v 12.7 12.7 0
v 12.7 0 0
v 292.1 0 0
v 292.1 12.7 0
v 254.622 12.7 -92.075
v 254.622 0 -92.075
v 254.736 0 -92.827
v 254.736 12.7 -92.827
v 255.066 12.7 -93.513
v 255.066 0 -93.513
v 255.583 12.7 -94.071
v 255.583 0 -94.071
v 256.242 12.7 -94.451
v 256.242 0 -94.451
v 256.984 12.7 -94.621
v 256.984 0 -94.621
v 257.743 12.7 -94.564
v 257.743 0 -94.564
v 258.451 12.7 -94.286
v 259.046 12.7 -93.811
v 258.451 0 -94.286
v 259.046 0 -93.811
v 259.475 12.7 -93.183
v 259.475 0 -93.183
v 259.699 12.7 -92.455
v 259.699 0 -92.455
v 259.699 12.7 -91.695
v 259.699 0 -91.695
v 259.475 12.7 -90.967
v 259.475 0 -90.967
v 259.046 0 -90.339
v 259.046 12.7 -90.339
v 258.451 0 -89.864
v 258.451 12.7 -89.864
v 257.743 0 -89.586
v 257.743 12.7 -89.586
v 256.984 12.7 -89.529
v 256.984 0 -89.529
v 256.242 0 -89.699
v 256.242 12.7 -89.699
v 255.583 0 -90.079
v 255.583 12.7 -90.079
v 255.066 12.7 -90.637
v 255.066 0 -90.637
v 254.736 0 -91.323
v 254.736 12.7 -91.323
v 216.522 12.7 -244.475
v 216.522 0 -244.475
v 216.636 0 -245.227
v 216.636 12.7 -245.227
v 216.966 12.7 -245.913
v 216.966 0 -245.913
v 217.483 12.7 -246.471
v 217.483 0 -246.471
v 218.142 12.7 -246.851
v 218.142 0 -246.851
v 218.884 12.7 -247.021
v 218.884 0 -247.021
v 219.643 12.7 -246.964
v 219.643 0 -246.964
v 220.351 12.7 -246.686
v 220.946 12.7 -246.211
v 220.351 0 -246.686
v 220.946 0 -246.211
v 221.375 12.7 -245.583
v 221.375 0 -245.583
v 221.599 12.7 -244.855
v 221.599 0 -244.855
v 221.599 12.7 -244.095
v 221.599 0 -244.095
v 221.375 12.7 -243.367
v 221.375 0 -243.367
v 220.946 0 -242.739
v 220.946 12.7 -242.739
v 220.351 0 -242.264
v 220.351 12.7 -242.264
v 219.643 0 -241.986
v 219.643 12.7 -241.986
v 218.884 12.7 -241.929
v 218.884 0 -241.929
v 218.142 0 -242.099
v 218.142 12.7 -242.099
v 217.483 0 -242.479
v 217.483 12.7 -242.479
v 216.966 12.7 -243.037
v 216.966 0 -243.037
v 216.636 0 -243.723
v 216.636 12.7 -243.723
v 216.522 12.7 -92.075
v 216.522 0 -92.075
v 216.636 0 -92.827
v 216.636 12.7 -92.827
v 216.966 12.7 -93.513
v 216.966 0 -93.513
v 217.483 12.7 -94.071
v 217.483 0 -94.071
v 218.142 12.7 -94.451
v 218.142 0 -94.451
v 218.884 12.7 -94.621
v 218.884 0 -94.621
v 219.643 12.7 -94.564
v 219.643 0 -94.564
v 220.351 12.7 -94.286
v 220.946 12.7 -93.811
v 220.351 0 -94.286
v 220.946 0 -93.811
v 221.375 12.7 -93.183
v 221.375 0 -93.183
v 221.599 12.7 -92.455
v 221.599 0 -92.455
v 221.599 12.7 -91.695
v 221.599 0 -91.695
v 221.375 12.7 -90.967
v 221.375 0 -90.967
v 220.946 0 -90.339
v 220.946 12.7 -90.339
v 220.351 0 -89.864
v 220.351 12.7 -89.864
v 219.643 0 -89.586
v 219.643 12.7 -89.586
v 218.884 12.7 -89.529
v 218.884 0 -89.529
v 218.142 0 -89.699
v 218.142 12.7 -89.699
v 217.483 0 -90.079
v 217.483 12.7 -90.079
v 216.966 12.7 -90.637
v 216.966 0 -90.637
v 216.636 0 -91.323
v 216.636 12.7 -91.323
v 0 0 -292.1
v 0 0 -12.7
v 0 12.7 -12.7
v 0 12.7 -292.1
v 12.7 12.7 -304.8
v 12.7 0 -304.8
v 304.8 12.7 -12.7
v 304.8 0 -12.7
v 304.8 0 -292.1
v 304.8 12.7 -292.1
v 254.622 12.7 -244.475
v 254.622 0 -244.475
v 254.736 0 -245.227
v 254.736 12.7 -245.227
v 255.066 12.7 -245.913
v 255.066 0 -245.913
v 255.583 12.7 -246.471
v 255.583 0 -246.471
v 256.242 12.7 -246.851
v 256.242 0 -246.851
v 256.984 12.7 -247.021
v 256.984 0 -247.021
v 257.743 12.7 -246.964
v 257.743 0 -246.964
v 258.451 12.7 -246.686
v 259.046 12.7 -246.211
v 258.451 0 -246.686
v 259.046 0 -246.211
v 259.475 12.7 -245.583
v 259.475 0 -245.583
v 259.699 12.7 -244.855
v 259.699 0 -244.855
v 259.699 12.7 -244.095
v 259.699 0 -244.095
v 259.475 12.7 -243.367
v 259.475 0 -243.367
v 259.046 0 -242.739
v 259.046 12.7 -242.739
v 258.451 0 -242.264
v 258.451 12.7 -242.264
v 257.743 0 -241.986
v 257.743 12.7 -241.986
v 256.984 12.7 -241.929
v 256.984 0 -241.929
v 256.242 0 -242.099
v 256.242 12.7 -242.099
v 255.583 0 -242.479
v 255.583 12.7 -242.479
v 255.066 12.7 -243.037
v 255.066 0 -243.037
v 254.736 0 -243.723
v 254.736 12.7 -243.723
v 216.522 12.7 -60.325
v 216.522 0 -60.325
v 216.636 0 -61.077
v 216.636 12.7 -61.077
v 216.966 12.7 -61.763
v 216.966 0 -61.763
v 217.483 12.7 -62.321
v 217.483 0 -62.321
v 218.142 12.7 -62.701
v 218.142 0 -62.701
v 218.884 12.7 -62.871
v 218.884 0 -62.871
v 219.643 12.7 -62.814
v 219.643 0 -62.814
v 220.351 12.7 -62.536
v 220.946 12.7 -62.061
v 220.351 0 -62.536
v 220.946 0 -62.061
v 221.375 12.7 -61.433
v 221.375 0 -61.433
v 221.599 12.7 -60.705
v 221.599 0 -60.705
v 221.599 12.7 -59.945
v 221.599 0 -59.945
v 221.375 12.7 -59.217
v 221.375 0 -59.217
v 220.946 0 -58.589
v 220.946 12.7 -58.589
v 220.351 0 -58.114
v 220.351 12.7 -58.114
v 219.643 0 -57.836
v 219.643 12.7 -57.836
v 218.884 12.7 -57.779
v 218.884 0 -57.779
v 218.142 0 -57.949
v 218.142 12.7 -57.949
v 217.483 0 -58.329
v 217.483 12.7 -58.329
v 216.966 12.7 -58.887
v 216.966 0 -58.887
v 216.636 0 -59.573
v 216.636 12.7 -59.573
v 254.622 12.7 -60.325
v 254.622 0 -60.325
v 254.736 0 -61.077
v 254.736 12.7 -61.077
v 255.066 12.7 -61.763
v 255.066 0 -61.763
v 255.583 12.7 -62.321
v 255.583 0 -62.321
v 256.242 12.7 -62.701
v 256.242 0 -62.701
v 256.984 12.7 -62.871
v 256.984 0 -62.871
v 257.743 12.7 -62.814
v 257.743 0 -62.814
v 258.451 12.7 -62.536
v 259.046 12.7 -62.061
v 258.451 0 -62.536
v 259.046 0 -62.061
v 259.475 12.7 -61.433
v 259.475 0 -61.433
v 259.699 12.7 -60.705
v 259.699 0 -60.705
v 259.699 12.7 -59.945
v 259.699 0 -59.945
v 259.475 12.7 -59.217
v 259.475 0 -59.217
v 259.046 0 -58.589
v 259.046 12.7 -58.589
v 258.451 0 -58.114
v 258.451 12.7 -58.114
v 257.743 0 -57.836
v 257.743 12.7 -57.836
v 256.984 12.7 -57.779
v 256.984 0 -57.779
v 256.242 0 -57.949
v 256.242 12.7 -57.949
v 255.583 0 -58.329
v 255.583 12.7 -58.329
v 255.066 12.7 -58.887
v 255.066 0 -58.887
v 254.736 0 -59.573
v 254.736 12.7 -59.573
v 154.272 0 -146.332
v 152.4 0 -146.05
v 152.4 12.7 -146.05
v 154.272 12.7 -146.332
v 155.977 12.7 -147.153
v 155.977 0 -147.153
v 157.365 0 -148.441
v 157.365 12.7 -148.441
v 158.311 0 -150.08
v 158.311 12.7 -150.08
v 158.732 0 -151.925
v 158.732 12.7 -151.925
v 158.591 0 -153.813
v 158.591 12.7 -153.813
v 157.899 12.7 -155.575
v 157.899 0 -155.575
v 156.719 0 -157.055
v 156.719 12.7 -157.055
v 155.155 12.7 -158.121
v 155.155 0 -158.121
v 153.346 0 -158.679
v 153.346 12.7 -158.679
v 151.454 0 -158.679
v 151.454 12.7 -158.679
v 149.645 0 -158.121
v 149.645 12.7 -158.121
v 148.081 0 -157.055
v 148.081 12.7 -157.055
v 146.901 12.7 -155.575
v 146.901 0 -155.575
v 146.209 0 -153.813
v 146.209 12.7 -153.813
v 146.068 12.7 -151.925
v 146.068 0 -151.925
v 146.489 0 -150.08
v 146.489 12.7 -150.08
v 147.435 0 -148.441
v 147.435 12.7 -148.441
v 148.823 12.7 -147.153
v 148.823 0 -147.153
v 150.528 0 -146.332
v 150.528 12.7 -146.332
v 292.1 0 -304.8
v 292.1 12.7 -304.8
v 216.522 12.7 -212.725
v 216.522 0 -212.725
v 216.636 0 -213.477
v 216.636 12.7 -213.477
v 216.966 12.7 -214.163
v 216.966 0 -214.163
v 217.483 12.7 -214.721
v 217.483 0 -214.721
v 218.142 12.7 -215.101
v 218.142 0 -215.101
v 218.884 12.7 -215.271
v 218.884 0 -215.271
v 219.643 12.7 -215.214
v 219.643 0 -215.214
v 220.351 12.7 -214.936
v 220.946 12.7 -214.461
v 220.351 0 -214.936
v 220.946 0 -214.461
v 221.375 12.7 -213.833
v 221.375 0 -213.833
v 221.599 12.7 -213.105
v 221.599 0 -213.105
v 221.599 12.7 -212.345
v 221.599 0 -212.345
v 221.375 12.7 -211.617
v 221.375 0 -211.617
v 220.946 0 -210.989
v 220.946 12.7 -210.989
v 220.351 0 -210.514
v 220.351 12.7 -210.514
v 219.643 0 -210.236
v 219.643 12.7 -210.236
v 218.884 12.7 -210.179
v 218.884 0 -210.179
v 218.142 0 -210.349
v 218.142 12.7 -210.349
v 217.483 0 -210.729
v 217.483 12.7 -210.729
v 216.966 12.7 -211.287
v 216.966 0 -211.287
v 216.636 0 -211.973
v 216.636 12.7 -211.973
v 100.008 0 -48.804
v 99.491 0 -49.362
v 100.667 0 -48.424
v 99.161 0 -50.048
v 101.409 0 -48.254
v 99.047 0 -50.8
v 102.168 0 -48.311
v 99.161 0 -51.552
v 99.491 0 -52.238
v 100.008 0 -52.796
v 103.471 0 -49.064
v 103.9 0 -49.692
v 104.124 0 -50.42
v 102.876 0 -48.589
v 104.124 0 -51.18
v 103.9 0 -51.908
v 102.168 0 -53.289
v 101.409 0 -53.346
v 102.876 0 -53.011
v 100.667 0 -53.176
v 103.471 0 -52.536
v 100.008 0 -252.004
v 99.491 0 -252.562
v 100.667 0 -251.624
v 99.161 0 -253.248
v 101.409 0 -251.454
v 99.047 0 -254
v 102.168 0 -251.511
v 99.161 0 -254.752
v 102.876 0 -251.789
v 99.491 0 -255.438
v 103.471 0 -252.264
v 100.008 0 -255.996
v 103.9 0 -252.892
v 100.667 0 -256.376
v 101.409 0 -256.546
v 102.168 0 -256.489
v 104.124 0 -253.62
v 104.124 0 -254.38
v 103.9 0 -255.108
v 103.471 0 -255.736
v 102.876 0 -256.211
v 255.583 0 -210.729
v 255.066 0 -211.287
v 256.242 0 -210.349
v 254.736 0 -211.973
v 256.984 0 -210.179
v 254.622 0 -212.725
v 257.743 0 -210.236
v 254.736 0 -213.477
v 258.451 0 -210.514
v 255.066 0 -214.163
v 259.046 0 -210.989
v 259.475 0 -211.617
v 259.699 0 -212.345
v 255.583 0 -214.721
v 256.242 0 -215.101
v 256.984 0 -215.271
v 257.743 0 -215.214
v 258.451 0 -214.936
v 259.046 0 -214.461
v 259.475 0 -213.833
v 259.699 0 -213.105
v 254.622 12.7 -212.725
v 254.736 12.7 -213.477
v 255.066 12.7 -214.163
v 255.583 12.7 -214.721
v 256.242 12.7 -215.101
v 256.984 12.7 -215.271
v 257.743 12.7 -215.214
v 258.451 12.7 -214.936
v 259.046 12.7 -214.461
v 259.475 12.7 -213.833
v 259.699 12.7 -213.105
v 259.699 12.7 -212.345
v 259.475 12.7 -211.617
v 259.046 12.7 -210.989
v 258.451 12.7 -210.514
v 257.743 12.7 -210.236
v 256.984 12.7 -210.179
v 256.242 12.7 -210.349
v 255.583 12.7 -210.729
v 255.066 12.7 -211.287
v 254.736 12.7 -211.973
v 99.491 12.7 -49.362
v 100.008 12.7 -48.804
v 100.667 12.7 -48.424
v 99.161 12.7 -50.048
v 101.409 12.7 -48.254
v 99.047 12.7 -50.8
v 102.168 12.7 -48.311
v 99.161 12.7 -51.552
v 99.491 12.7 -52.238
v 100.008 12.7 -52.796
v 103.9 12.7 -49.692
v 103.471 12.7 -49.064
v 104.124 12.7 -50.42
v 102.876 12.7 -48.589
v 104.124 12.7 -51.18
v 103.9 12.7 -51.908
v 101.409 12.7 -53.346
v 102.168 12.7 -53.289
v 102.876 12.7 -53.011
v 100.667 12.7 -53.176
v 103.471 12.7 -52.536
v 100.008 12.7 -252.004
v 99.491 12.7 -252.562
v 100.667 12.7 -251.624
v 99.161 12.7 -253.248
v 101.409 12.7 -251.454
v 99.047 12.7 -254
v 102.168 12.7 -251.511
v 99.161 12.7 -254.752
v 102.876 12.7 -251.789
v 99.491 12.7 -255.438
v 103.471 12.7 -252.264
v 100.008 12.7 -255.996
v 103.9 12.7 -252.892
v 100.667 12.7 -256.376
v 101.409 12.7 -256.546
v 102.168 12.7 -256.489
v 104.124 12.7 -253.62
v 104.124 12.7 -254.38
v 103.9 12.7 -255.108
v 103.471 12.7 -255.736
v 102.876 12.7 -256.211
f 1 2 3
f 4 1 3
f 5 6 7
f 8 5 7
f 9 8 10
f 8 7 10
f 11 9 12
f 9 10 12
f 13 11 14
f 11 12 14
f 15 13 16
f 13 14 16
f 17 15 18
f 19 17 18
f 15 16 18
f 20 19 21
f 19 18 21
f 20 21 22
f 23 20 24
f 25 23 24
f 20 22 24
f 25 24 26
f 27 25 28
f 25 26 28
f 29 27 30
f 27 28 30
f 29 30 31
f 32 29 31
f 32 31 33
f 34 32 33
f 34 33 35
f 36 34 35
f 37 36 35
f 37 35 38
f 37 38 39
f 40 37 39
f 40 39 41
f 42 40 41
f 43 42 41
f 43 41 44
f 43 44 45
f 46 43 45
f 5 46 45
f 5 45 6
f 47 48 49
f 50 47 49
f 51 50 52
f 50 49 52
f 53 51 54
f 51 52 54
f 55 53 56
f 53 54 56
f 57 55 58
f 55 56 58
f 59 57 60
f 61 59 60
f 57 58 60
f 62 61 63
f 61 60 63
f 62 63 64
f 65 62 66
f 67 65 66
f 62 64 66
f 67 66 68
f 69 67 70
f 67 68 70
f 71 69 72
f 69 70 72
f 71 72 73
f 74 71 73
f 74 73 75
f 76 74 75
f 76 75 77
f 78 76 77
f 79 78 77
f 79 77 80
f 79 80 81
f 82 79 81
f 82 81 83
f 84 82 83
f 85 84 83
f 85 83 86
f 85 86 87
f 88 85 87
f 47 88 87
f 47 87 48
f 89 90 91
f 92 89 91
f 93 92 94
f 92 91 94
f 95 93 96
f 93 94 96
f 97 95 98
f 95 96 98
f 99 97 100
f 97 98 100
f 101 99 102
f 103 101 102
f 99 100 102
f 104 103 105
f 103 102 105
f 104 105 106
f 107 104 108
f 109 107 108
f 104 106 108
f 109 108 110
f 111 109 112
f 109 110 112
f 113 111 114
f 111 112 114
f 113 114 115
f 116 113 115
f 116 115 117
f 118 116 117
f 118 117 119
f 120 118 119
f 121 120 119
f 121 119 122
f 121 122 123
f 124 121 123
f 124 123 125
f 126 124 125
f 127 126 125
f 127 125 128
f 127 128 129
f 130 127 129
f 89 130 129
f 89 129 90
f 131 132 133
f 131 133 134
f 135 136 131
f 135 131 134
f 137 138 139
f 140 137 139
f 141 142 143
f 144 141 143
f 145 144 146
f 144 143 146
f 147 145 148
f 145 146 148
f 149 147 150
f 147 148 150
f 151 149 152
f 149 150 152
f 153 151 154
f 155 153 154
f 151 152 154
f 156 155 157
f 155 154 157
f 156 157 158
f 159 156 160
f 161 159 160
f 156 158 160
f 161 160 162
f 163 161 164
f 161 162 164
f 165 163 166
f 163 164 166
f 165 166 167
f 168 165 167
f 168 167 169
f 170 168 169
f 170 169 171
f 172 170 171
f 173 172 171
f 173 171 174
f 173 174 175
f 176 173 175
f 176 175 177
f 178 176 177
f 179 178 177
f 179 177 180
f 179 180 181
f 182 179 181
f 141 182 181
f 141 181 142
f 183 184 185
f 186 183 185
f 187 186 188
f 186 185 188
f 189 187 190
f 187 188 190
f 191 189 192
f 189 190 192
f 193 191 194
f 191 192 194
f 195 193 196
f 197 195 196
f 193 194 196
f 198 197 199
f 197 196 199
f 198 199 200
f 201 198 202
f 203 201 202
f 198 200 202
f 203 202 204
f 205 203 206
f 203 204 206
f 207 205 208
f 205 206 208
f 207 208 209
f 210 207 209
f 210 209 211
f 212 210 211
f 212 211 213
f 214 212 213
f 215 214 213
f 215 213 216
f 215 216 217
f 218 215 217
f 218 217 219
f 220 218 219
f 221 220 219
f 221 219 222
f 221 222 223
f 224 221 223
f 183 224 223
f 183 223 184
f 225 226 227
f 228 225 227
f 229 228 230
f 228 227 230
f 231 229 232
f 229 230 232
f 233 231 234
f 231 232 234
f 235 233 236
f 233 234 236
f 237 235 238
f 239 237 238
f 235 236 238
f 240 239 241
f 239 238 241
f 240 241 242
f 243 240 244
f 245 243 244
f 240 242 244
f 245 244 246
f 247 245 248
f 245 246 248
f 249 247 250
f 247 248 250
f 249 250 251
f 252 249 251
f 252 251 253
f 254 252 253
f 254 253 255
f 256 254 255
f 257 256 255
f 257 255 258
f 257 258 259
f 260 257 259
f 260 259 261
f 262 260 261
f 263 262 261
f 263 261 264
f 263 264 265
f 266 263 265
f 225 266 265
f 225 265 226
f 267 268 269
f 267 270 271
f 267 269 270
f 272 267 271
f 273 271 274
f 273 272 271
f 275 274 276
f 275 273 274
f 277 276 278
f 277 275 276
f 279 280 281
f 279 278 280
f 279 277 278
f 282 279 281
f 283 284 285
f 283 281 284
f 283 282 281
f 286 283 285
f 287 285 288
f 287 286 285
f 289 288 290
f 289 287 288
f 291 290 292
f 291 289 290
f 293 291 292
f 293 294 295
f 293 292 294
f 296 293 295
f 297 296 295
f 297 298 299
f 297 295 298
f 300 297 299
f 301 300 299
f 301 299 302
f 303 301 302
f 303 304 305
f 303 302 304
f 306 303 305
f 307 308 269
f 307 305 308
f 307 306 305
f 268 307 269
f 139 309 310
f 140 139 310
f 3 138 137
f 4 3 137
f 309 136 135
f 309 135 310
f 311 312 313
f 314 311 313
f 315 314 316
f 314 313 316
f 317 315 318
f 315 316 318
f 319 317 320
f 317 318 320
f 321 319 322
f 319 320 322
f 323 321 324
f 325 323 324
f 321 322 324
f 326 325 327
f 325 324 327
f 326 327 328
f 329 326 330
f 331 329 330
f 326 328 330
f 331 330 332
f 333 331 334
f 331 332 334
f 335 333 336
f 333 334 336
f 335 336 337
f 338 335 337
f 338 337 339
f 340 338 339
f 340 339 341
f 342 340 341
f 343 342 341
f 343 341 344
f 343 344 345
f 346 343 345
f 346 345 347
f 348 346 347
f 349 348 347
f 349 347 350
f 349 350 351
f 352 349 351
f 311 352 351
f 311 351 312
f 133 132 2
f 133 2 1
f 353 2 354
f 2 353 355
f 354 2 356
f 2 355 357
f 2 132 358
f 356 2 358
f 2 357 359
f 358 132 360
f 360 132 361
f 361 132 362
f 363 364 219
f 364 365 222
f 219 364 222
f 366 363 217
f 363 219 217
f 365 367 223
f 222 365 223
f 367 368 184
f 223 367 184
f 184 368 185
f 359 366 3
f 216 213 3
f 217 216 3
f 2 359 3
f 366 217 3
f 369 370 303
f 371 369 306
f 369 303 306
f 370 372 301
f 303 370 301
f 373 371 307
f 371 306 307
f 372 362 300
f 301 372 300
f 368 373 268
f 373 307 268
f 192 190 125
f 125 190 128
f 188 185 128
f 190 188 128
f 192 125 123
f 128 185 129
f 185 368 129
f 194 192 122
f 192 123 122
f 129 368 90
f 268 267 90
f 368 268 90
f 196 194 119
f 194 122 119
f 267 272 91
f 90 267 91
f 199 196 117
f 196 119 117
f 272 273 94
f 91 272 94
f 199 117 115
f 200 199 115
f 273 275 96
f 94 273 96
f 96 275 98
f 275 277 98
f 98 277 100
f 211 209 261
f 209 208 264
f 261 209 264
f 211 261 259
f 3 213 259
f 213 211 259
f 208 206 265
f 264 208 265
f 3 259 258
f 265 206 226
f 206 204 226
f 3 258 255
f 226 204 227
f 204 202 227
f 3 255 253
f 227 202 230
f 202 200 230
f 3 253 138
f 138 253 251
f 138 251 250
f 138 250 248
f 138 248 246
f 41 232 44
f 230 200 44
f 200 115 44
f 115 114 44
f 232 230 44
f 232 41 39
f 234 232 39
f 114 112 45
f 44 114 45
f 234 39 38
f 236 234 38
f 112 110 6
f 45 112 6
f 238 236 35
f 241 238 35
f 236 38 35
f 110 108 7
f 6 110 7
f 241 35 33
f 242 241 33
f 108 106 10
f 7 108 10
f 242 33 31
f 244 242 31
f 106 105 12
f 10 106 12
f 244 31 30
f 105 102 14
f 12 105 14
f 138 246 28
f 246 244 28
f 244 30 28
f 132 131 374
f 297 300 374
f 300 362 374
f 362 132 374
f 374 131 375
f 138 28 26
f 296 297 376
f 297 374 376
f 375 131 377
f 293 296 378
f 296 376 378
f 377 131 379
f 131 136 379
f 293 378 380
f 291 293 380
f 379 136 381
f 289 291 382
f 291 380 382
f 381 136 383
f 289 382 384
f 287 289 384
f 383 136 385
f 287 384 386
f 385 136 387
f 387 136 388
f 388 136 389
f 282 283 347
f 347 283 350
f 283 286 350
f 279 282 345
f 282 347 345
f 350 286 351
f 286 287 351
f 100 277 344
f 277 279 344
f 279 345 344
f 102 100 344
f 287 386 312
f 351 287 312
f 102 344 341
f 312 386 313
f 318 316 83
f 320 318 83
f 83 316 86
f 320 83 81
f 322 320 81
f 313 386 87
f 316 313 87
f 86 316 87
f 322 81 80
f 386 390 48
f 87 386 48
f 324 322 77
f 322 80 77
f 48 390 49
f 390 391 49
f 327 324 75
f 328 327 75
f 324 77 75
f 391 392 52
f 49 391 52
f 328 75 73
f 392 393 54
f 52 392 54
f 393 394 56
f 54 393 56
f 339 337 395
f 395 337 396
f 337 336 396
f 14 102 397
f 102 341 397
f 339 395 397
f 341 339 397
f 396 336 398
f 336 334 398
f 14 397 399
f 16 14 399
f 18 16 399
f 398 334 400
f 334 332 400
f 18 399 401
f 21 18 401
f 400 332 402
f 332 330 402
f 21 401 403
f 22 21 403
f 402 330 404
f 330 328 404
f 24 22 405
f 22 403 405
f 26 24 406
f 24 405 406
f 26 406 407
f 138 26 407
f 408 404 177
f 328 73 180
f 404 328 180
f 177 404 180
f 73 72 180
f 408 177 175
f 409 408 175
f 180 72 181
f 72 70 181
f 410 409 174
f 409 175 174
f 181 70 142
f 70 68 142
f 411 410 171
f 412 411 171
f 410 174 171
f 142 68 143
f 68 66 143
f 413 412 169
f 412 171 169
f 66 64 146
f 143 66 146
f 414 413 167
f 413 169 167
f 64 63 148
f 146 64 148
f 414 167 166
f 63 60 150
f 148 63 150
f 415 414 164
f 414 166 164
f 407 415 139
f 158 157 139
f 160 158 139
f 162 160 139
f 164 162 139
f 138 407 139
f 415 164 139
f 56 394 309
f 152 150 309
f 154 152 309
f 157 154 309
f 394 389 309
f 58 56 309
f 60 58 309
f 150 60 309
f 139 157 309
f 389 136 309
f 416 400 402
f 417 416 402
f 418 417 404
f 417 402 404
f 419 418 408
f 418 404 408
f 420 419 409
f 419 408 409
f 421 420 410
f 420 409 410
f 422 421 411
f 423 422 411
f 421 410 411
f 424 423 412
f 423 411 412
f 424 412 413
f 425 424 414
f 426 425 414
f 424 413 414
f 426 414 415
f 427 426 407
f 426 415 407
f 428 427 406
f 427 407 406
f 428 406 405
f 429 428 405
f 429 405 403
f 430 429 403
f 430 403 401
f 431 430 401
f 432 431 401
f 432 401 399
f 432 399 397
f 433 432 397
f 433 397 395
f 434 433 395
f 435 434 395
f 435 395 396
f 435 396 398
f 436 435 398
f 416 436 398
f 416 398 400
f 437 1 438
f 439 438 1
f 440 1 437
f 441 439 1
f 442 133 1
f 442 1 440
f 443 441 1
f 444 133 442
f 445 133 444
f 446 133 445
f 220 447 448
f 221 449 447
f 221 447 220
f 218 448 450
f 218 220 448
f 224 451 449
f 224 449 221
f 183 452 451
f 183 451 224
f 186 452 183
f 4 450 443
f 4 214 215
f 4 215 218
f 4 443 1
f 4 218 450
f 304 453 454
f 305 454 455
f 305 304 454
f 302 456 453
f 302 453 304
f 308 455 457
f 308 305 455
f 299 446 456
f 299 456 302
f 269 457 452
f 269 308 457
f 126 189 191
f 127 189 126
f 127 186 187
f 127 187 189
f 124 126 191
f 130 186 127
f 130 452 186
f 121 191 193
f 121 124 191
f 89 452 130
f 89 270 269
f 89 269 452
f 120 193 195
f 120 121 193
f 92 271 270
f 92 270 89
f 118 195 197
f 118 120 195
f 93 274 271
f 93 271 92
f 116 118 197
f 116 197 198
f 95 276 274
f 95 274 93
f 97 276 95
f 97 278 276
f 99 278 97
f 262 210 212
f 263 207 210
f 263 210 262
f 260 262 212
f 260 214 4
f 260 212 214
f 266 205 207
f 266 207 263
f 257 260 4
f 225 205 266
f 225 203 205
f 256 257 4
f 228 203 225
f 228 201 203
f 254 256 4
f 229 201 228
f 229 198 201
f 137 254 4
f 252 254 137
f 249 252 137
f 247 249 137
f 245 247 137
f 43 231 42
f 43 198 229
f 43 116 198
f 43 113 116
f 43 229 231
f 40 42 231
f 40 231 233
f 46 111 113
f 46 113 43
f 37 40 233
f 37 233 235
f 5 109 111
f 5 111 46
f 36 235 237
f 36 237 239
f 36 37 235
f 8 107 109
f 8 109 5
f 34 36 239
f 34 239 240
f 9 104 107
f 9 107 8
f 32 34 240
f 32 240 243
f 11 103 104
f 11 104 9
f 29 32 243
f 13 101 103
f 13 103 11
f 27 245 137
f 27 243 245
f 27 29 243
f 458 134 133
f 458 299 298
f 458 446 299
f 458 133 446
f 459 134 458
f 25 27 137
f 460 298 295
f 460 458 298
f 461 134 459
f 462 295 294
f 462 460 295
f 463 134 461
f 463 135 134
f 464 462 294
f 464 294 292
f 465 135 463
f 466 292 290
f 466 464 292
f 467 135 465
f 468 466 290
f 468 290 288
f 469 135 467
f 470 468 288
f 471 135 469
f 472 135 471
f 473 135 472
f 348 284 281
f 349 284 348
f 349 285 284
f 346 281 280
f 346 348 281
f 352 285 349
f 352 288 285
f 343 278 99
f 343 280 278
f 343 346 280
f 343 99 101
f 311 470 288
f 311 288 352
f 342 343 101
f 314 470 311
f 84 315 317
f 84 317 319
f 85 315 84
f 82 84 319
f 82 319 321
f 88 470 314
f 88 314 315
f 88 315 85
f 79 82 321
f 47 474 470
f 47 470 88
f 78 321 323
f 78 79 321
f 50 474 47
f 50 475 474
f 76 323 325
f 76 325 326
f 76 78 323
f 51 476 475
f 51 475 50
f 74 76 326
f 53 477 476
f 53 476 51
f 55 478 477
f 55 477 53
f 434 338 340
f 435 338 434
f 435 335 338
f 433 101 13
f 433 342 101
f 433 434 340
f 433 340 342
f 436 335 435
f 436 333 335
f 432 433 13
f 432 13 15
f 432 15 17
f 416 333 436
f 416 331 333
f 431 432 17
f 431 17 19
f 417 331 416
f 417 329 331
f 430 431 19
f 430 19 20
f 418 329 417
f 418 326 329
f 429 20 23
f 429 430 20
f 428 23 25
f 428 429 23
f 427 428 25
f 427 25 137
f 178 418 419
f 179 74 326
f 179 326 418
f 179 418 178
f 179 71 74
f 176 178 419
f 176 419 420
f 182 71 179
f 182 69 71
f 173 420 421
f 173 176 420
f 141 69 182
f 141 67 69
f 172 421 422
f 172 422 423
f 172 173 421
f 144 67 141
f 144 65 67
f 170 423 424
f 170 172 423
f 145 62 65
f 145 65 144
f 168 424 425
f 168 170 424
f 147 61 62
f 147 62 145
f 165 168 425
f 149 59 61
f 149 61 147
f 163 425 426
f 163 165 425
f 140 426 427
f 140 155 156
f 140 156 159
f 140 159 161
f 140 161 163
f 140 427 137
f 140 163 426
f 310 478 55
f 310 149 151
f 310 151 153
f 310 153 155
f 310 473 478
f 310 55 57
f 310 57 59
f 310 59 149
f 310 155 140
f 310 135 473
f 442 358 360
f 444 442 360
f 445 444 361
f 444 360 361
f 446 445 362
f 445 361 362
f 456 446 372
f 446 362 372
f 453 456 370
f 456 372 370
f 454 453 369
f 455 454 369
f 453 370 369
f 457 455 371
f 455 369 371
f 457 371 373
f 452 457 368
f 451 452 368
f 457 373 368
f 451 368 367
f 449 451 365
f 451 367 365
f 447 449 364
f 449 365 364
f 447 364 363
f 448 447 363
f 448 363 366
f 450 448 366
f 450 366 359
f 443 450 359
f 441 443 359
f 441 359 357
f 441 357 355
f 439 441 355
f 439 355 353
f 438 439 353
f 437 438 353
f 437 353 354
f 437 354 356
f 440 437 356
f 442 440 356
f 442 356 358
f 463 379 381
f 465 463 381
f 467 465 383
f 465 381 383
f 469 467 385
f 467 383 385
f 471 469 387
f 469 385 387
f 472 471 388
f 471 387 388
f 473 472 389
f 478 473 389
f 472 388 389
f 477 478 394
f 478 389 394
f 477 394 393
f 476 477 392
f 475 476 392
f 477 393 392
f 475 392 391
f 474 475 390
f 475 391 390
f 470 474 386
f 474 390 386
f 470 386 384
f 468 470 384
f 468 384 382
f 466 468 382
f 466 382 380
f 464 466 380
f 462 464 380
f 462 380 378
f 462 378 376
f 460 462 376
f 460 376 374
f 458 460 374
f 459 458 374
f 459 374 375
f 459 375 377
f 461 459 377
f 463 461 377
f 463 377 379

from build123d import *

# Parameters (mm, degrees)
SKETCH1_W               = 304.8
SKETCH1_H               = 304.8
BOSS_EXTRUDE1_DEPTH     = 12.7
CHAMFER1_SIZE           = 12.7
F_1_4_20_TAPPED_HOLE1_D = 5.1054
CUT_EXTRUDE1_DEPTH      = 432.239341897
CUT_EXTRUDE1_DEPTH_BACK = 432.239341897
SKETCH4_R               = 6.35
F_1_4_20_TAPPED_HOLE2_D = 5.1054


with BuildPart() as part:
    # Sketch1 → Boss-Extrude1 (new body)
    with BuildSketch(Plane(origin=(0, 0, 0), x_dir=(1, 0, 0), z_dir=(0, 1, 0))):
        with Locations((152.4, 152.4)):
            Rectangle(SKETCH1_W, SKETCH1_H)
    extrude(amount=BOSS_EXTRUDE1_DEPTH)

    # Chamfer1
    chamfer1_edges = [part.edges().sort_by_distance(p)[0] for p in [
        (0, 6.35, -304.8),
        (304.8, 6.35, -304.8),
        (304.8, 6.35, 0),
        (0, 6.35, 0),
    ]]
    chamfer(chamfer1_edges, length=CHAMFER1_SIZE)

    # 1/4-20 Tapped Hole1 (through all)
    with Locations(Plane(origin=(0, 12.7, 0), x_dir=(1, 0, 0), z_dir=(0, 1, 0))):
        with Locations((101.6, 50.8), (101.6, 254)):
            Hole(F_1_4_20_TAPPED_HOLE1_D / 2)

    # Sketch4 → Cut-Extrude1 (cut, two sides: drawn at the far end of the back side and taken through both)
    with BuildSketch(Plane(origin=(0, 12.7, 0), x_dir=(1, 0, 0), z_dir=(0, 1, 0)).offset(-CUT_EXTRUDE1_DEPTH_BACK)):
        with Locations(Location((152.4, 152.4, 0), (0, 0, 270))):
            Circle(SKETCH4_R)
    extrude(amount=CUT_EXTRUDE1_DEPTH + CUT_EXTRUDE1_DEPTH_BACK, mode=Mode.SUBTRACT)

    # 1/4-20 Tapped Hole2 (through all)
    with Locations(Plane(origin=(0, 12.7, 0), x_dir=(1, 0, 0), z_dir=(0, 1, 0))):
        with Locations((257.175, 244.475), (219.075, 244.475), (257.175, 212.725), (219.075, 212.725), (257.175, 92.075), (219.075, 92.075), (257.175, 60.325), (219.075, 60.325)):
            Hole(F_1_4_20_TAPPED_HOLE2_D / 2)


solid = part.part
